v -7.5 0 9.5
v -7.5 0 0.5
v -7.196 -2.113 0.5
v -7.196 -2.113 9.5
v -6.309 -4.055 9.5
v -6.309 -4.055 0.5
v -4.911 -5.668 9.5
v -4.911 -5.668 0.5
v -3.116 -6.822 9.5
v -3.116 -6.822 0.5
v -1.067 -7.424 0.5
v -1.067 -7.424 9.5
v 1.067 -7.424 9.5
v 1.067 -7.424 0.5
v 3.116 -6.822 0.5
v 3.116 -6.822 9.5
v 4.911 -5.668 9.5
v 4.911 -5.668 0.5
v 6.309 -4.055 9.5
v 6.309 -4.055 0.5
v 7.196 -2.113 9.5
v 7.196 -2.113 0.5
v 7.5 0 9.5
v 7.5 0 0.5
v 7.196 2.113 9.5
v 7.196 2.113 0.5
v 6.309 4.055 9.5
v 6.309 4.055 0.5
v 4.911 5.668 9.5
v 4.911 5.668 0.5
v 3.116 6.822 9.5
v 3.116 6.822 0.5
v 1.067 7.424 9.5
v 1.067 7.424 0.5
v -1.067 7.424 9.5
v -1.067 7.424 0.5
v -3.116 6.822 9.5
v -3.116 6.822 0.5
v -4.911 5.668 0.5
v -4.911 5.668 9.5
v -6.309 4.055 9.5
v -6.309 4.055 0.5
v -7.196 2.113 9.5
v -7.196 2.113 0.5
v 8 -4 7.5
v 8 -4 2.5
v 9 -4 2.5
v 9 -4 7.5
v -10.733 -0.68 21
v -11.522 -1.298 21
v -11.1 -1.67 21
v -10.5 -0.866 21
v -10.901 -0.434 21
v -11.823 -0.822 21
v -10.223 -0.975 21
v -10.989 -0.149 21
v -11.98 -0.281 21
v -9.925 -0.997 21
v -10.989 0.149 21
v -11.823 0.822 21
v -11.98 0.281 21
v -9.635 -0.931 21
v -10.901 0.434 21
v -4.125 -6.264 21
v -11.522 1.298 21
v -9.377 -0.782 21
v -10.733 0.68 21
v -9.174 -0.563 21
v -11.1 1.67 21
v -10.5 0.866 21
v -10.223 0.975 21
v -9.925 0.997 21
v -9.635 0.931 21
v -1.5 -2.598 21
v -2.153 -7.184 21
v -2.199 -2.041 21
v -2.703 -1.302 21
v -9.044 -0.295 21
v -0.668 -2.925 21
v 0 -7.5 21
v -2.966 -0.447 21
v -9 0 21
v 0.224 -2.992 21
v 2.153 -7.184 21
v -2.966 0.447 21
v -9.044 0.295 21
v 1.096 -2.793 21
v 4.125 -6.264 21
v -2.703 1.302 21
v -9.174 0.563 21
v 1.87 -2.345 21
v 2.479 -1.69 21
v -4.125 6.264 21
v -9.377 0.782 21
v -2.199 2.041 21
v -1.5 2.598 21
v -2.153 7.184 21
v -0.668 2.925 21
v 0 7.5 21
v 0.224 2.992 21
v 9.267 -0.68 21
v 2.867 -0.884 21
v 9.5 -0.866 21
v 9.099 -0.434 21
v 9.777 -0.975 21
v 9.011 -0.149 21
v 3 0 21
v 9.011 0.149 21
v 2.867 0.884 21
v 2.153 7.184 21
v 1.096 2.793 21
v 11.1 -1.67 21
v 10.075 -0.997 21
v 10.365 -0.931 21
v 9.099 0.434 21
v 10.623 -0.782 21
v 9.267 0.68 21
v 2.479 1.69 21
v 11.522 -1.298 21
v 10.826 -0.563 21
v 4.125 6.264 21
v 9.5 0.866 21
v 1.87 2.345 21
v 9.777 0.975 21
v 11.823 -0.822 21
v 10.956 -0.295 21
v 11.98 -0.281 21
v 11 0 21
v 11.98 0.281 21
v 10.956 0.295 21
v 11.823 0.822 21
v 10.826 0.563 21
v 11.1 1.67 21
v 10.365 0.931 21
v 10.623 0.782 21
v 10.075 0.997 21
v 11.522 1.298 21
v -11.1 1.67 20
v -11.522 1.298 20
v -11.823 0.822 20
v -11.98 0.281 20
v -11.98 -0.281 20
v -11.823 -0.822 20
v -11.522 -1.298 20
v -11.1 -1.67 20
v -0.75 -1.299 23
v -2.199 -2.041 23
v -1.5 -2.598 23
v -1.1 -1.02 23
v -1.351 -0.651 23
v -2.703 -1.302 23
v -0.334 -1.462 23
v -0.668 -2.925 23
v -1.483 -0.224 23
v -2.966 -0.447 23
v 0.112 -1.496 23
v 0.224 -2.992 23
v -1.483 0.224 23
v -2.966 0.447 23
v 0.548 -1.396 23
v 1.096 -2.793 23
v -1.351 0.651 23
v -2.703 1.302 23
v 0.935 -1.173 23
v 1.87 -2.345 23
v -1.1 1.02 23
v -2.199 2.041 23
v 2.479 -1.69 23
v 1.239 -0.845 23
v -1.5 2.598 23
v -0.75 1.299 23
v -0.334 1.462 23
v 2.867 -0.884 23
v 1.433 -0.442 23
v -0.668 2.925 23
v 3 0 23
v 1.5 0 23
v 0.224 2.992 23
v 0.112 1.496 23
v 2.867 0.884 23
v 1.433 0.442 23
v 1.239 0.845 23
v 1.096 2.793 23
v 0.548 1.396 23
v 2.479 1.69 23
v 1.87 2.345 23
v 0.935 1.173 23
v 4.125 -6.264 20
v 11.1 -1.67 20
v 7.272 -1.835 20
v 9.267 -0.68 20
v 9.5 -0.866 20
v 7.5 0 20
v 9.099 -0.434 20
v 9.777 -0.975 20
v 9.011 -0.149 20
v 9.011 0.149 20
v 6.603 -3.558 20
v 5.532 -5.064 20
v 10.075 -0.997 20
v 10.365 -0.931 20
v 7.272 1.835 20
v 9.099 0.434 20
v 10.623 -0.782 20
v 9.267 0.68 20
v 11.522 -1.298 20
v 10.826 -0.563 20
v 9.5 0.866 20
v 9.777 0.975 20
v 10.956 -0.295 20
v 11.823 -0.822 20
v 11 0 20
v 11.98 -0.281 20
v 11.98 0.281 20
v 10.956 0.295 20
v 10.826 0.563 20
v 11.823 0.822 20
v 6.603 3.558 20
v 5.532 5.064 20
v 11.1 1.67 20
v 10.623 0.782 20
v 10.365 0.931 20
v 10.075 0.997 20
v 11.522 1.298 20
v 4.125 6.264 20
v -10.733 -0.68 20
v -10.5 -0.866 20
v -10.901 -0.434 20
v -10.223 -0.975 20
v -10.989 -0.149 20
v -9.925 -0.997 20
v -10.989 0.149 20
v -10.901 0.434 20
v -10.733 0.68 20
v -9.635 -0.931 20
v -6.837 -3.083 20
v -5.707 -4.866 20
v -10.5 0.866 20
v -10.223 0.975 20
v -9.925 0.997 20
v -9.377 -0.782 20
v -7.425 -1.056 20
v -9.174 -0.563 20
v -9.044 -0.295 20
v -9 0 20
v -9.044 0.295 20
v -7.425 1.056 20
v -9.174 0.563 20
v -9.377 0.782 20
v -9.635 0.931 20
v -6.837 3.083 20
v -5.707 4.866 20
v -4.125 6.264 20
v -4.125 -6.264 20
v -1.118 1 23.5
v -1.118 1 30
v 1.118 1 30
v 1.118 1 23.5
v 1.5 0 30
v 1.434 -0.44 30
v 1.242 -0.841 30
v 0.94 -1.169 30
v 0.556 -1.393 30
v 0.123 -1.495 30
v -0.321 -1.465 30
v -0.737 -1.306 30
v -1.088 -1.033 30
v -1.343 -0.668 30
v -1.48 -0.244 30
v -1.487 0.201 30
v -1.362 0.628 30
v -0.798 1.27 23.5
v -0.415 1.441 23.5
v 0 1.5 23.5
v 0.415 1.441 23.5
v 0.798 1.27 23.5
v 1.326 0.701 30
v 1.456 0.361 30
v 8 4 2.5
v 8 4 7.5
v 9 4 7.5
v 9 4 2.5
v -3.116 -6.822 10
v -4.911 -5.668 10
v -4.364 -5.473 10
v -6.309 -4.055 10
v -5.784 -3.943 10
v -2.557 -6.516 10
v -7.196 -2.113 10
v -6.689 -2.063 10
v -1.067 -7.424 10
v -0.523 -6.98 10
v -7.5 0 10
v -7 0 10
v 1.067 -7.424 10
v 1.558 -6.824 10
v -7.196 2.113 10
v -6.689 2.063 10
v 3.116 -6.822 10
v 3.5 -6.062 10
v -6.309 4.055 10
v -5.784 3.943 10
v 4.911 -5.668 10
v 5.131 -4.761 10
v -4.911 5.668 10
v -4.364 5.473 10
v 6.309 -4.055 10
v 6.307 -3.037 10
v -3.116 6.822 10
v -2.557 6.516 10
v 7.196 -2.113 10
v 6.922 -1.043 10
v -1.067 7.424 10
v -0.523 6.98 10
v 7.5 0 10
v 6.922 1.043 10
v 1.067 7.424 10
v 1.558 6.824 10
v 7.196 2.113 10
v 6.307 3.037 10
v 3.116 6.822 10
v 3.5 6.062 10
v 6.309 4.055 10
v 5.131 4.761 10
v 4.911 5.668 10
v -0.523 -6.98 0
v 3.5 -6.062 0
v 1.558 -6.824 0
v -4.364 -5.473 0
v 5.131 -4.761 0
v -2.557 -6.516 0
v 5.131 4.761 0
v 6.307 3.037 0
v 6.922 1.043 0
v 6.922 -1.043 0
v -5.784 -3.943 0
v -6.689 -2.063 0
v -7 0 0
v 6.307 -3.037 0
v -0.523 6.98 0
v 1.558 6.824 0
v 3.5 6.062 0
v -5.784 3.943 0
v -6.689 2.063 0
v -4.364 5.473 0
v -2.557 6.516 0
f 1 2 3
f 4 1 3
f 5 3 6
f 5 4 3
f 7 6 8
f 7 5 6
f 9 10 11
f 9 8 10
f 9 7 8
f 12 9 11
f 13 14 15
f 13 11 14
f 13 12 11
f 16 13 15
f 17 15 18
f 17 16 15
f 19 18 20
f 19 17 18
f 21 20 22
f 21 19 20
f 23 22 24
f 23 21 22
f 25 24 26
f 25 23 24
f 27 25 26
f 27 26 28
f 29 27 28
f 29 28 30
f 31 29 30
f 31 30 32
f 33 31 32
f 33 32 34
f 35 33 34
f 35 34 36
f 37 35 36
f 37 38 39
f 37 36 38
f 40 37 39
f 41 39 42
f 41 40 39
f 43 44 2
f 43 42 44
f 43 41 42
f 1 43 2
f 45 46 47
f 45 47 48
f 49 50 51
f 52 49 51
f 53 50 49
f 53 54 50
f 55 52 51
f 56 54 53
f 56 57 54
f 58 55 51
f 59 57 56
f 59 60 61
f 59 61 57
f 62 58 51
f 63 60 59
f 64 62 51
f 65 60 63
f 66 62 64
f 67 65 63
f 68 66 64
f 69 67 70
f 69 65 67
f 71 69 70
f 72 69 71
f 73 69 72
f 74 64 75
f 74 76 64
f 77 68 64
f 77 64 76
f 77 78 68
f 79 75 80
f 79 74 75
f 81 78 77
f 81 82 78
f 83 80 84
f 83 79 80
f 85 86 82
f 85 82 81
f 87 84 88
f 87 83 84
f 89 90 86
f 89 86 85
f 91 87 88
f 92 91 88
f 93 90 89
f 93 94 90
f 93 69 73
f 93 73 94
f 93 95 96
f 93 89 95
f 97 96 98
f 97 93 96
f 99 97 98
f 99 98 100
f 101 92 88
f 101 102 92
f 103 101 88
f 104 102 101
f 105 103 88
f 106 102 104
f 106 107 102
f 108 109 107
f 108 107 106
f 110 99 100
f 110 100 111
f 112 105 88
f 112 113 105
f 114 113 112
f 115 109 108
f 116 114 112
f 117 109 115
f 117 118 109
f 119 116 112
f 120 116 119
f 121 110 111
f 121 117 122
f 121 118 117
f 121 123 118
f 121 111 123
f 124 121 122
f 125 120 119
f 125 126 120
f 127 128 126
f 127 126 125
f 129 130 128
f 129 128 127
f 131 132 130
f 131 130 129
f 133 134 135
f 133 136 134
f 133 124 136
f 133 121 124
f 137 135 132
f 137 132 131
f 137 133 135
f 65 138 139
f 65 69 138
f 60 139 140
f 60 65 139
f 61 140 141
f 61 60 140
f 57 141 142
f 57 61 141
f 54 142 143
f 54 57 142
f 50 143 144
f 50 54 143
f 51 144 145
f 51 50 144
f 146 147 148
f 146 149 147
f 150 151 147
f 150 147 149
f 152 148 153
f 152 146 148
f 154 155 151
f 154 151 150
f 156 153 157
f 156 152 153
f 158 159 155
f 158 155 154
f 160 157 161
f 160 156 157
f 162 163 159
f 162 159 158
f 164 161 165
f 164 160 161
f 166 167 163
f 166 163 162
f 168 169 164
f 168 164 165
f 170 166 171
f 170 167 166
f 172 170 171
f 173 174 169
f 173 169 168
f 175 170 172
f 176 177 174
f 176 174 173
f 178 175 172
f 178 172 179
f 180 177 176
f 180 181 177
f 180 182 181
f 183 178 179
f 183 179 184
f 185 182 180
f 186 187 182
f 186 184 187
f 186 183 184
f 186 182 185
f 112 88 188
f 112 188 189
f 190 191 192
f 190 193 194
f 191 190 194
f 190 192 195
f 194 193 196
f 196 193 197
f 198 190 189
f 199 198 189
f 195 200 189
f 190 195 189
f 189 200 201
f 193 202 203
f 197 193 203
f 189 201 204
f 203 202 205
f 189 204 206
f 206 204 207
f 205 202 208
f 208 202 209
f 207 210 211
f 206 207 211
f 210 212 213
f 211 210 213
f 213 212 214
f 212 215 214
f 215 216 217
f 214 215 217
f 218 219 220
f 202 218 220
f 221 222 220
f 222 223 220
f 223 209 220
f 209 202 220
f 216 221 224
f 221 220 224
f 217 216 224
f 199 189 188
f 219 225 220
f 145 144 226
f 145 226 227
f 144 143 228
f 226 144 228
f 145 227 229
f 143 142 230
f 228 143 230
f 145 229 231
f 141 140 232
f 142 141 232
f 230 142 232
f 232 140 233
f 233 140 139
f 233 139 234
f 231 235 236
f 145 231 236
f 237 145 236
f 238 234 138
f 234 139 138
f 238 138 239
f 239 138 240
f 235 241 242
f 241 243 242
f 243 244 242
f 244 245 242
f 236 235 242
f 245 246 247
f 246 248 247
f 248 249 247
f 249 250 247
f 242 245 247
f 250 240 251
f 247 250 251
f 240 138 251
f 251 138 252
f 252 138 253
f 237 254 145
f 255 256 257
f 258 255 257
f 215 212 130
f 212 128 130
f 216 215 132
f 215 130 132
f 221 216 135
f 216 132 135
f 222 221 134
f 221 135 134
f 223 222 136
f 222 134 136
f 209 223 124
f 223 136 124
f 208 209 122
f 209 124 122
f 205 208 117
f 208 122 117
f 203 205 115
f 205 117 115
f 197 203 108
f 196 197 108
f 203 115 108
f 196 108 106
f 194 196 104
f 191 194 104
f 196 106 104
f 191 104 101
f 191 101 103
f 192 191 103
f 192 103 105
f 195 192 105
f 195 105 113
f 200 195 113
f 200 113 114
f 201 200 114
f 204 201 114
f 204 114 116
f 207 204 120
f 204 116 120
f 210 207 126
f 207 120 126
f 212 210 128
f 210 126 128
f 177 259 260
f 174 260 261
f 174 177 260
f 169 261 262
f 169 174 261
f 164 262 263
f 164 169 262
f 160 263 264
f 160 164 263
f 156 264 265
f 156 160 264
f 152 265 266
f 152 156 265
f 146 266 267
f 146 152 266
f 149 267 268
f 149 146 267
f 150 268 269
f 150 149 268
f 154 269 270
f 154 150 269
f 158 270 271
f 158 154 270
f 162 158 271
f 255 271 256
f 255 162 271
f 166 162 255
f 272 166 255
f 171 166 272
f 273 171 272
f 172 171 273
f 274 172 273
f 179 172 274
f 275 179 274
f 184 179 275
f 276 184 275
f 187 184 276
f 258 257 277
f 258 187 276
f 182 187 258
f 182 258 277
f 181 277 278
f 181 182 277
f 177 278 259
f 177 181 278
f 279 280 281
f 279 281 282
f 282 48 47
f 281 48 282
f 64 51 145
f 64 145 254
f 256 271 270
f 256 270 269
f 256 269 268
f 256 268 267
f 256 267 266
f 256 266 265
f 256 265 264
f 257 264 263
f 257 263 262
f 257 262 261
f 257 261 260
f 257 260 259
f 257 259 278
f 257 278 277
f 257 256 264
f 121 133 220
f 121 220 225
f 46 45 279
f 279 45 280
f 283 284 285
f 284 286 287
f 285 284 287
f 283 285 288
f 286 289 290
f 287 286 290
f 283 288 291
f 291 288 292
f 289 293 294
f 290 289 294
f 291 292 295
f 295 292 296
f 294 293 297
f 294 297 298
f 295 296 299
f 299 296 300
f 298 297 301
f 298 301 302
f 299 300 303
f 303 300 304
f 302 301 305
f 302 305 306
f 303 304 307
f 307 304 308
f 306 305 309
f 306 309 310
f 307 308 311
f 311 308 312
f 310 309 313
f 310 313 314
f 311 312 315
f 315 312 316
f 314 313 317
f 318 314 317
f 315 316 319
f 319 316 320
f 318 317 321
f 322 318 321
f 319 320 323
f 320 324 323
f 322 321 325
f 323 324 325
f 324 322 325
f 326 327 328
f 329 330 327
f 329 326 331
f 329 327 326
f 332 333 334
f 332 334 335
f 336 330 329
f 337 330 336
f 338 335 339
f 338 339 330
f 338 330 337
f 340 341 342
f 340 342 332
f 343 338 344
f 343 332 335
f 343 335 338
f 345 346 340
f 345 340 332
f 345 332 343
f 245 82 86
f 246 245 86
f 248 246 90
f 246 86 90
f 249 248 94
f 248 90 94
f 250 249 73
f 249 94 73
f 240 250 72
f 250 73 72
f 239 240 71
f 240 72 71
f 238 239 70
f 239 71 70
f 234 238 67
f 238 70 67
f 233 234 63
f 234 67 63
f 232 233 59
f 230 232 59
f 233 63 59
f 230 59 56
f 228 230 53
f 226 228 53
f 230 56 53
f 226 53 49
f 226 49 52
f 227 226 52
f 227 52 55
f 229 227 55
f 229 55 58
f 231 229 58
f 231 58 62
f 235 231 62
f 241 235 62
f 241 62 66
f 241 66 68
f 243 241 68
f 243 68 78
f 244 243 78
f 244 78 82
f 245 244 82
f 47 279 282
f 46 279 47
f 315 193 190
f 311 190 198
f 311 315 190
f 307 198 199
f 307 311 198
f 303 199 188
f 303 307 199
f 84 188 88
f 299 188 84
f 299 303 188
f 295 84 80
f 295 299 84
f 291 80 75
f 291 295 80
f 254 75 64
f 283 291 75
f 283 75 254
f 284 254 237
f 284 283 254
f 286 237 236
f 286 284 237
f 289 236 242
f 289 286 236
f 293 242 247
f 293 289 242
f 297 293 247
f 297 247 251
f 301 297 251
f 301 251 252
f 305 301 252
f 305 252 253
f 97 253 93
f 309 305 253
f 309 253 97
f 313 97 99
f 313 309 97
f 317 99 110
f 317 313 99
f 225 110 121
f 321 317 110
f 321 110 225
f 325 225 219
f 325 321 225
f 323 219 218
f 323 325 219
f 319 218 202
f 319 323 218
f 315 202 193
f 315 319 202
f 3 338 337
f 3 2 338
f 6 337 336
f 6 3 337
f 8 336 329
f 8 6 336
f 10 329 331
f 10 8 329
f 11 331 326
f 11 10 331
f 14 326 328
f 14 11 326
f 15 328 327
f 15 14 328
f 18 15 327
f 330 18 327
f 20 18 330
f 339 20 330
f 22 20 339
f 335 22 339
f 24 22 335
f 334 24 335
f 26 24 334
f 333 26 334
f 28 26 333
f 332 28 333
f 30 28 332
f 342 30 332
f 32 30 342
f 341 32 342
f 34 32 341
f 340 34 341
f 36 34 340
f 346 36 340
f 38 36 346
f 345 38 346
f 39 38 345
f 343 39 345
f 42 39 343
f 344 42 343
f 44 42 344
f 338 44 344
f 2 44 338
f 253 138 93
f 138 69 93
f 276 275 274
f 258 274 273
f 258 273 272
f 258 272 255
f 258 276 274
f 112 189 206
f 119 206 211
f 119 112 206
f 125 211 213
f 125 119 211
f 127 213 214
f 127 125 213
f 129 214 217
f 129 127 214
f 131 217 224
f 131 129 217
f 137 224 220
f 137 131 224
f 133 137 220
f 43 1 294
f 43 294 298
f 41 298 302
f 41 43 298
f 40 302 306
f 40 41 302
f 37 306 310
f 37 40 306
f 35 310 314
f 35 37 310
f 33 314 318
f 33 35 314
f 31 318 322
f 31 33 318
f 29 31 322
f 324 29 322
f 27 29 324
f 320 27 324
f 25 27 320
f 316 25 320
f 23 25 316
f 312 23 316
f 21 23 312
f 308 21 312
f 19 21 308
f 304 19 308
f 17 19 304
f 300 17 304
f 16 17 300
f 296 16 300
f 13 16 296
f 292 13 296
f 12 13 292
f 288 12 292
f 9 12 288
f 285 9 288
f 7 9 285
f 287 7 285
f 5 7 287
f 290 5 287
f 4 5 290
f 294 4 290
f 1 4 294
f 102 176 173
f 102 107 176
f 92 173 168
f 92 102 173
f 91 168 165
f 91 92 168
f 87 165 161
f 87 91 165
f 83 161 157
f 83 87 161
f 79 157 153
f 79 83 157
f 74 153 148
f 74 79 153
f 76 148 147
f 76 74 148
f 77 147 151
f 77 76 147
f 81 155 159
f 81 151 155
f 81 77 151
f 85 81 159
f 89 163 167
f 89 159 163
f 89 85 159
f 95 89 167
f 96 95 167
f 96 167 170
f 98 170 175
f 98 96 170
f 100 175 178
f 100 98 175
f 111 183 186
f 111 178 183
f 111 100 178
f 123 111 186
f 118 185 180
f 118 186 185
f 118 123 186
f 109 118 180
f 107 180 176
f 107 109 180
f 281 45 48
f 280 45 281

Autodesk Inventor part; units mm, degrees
ref_plane "XZ Plane" through (0, 0, 0) normal (0, 1, 0) x (-1, 0, 0)
ref_plane "XY Plane" through (0, 0, 0) normal (0, 0, 1) x (1, 0, 0)
sketch "スケッチ2" plane through (0, 0, 0) normal (0, 1, 0) x (-1, 0, 0)
  line L0 (0, 0) -> (7, 0)
  line L1 (7, 0) -> (7.5, 0.5)
  line L2 (7.5, 0.5) -> (7.5, 9.5)
  line L3 (7.5, 9.5) -> (7, 10)
  line L4 (7, 10) -> (0, 10)
  line L5 (0, 10) -> (0, 0)
  dimension "d0" = 7.5
  dimension "d1" = 10
  dimension "d2" = 135
  dimension "d3" = 0.5
revolve "回転1" add sketch "スケッチ2" angle 360 about axis through (0, 0, 10) along (0, 0, -1)
sketch "スケッチ3" plane through (0, 0, 10) normal (0, 0, 1) x (1, 0, 0)
  point P0 (0, 0)
sketch "スケッチ4" plane through (0, 0, 10) normal (0, 0, 1) x (1, 0, 0)
  circle A0 centre (0, 0) radius 7.5
  circle A1 centre (0, 0) radius 7.5 projected
extrude "押し出し1" add sketch "スケッチ4" along normal blind 11
sketch "スケッチ5" plane through (0, 0, 21) normal (0, 0, 1) x (1, 0, 0)
  line L0 (-15.0014, 0) -> (15.0014, 0) construction
  line L1 (0, 10.7122) -> (0, -10.7122) construction
  circle A0 centre (-10, 0) radius 1
  circle A1 centre (10, 0) radius 1
  circle A2 centre (-10, 0) radius 2
  circle A3 centre (10, 0) radius 2
  circle A4 centre (0, 0) radius 7.5
  circle A5 centre (0, 0) radius 7.5 projected
  line L2 (-11.1, 1.6703) -> (-4.125, 6.2637)
  line L3 (-11.1, -1.6703) -> (-4.125, -6.2637)
  line L4 (4.125, -6.2637) -> (11.1, -1.6703)
  line L5 (11.1, 1.6703) -> (4.125, 6.2637)
  point P0 (0, 0)
  point P1 (-4.125, -6.2637)
  dimension "d7" = 2
  dimension "d8" = 20
  dimension "d9" = 4
extrude "押し出し2" add sketch "スケッチ5" against normal blind 1 contours A2 | A2 L2 A4 L3 | L5 A3 L4 A4 | A3
sketch "スケッチ6" plane through (0, 0, 21) normal (0, 0, 1) x (1, 0, 0)
  circle A0 centre (0, 0) radius 3
  dimension "d12" = 6
extrude "押し出し3" add sketch "スケッチ6" along normal blind 2
sketch "スケッチ7" plane through (0, 0, 23) normal (0, 0, 1) x (1, 0, 0)
  circle A0 centre (0, 0) radius 1.5
  dimension "d15" = 3
extrude "押し出し4" add sketch "スケッチ7" along normal blind 7
sketch "スケッチ8" plane through (0, 0, 30) normal (0, 0, 1) x (1, 0, 0)
  circle A0 centre (0, 0) radius 1.5
  circle A1 centre (0, 0) radius 1.5 projected
  line L0 (-1.118, 1) -> (1.118, 1)
  dimension "d19" = 2.5
extrude "押し出し5" cut sketch "スケッチ8" against normal blind 6.5 contours L0 A0 picked at (-0.0599, 1.1631)
ref_plane "作業平面1" through (8, 0, 0) normal (1, 0, 0) x (0, 1, 0)
sketch "スケッチ9" plane through (8, 0, 0) normal (1, 0, 0) x (0, 1, 0)
  line L0 (-4, 7.5) -> (4, 7.5)
  line L1 (4, 7.5) -> (4, 2.5)
  line L2 (4, 2.5) -> (-4, 2.5)
  line L3 (-4, 2.5) -> (-4, 7.5)
  point P0 (0, 0)
  point P1 (0, 2.5)
  dimension "d23" = 8
  dimension "d24" = 5
  dimension "d25" = 2.5
extrude "押し出し6" add sketch "スケッチ9" along normal blind 1
properties part number "Stepper-D15-S18"
